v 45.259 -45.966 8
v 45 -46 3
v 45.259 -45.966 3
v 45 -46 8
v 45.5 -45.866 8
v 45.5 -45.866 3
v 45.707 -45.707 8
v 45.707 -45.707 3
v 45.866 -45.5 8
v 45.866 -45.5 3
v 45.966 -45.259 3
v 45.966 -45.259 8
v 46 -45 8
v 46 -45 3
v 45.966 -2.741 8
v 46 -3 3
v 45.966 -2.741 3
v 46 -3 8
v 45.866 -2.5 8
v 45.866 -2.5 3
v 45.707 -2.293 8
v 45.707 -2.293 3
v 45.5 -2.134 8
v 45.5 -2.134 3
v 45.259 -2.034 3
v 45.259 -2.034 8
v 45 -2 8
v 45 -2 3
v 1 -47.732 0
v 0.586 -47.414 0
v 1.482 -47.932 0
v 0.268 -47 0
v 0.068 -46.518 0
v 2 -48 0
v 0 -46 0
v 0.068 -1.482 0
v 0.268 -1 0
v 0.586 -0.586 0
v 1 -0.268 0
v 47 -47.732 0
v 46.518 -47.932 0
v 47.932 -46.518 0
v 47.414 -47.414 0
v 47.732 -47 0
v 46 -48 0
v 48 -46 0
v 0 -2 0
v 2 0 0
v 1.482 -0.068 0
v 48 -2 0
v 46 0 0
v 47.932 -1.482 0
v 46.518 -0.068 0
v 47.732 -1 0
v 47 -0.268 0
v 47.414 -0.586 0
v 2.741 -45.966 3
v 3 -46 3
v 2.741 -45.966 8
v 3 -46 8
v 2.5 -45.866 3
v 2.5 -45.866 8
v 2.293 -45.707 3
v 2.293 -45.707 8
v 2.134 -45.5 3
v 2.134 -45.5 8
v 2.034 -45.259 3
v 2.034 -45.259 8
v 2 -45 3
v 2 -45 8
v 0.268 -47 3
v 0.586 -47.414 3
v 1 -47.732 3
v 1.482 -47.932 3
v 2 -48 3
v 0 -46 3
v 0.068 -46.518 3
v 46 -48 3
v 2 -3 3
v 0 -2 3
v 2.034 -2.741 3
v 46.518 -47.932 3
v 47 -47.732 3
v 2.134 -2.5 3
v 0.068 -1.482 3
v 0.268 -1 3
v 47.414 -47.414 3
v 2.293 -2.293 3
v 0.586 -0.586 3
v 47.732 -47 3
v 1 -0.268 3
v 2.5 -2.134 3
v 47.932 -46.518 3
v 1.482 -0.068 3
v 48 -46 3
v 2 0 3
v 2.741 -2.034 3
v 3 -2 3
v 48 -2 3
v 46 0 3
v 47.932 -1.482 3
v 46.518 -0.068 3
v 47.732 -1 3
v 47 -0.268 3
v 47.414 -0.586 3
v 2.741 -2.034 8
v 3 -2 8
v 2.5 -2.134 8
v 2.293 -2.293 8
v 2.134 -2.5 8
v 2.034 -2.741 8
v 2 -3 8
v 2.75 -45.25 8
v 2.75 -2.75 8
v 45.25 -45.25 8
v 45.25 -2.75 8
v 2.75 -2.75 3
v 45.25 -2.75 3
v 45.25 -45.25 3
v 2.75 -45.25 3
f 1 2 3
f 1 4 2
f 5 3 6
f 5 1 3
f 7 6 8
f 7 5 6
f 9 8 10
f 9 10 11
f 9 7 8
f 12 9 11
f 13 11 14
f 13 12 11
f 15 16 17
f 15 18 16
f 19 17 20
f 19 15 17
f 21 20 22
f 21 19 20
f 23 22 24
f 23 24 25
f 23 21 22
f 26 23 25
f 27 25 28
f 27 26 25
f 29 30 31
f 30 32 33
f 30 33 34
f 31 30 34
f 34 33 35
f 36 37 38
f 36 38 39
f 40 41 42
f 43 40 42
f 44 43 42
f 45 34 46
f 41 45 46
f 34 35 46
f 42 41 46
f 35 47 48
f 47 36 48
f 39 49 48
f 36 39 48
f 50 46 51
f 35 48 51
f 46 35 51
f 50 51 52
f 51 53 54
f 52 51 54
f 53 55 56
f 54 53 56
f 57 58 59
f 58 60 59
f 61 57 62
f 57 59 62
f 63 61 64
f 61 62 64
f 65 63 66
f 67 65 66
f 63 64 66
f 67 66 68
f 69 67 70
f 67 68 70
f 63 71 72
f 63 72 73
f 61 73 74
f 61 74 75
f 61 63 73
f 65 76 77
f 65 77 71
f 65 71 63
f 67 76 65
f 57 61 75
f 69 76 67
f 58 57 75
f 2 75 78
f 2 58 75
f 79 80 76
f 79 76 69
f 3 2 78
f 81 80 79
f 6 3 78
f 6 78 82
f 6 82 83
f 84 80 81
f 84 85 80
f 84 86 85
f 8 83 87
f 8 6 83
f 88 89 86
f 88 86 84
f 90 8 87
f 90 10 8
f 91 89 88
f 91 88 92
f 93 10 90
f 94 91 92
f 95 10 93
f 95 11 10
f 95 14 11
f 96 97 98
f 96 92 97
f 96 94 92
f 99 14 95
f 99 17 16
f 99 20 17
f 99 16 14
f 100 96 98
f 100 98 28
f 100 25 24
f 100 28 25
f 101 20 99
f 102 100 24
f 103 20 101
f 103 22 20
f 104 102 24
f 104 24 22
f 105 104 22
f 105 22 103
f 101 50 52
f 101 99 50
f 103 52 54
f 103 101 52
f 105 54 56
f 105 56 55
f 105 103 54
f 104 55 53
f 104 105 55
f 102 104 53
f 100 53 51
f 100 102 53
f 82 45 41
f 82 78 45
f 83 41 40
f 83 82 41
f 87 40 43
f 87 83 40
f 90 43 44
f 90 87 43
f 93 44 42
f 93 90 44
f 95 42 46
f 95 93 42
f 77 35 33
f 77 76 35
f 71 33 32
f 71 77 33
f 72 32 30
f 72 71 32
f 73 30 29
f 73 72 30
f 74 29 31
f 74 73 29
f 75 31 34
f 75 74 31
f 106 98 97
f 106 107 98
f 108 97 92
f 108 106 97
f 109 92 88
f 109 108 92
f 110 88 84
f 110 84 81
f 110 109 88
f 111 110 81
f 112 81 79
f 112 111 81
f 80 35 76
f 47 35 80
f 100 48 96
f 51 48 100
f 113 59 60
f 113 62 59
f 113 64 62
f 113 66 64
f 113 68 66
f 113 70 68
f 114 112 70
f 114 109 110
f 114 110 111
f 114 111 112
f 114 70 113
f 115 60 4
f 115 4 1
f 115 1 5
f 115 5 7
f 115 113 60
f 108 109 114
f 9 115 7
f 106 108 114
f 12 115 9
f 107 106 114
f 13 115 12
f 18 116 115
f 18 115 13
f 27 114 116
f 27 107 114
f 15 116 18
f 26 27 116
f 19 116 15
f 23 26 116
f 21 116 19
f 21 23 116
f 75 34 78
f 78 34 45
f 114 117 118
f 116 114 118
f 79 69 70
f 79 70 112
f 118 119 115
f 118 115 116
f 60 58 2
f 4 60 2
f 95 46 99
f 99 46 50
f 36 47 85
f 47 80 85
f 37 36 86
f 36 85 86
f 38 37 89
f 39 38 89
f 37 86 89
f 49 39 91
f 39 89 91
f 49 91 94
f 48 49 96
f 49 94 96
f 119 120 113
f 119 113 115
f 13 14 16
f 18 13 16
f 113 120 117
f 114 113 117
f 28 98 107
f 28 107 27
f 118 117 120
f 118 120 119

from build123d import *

# Parameters (mm, degrees)
F0_W     = 48
F0_H     = 48
F1_DEPTH = 3
F2_R     = 2
F3_W     = 44
F3_H     = 44
F3_W_2   = 42.5
F3_H_2   = 42.5
F4_DEPTH = 5
F5_R     = 1


with BuildPart() as f1:
    # F0 (on Top) → F1 (new body)
    with BuildSketch(Plane.XY):
        with Locations((24, -24)):
            Rectangle(F0_W, F0_H)
    extrude(amount=F1_DEPTH)

    # F2
    f2_edges = [f1.edges().sort_by_distance(p)[0] for p in [
        (48, -48, 1.5),
        (0, -48, 1.5),
        (48, 0, 1.5),
        (0, 0, 1.5),
    ]]
    fillet(f2_edges, radius=F2_R)

    # F3 (on face) → F4 (join)
    with BuildSketch(Plane.XY.offset(3)):
        with Locations((24, -24)):
            Rectangle(F3_W, F3_H)
        with Locations((24, -24)):
            Rectangle(F3_W_2, F3_H_2, mode=Mode.SUBTRACT)
    extrude(amount=F4_DEPTH)

    # F5
    f5_edges = [f1.edges().sort_by_distance(p)[0] for p in [
        (46, -2, 5.5),
        (2, -2, 5.5),
        (2, -46, 5.5),
        (46, -46, 5.5),
    ]]
    fillet(f5_edges, radius=F5_R)


solid = f1.part
